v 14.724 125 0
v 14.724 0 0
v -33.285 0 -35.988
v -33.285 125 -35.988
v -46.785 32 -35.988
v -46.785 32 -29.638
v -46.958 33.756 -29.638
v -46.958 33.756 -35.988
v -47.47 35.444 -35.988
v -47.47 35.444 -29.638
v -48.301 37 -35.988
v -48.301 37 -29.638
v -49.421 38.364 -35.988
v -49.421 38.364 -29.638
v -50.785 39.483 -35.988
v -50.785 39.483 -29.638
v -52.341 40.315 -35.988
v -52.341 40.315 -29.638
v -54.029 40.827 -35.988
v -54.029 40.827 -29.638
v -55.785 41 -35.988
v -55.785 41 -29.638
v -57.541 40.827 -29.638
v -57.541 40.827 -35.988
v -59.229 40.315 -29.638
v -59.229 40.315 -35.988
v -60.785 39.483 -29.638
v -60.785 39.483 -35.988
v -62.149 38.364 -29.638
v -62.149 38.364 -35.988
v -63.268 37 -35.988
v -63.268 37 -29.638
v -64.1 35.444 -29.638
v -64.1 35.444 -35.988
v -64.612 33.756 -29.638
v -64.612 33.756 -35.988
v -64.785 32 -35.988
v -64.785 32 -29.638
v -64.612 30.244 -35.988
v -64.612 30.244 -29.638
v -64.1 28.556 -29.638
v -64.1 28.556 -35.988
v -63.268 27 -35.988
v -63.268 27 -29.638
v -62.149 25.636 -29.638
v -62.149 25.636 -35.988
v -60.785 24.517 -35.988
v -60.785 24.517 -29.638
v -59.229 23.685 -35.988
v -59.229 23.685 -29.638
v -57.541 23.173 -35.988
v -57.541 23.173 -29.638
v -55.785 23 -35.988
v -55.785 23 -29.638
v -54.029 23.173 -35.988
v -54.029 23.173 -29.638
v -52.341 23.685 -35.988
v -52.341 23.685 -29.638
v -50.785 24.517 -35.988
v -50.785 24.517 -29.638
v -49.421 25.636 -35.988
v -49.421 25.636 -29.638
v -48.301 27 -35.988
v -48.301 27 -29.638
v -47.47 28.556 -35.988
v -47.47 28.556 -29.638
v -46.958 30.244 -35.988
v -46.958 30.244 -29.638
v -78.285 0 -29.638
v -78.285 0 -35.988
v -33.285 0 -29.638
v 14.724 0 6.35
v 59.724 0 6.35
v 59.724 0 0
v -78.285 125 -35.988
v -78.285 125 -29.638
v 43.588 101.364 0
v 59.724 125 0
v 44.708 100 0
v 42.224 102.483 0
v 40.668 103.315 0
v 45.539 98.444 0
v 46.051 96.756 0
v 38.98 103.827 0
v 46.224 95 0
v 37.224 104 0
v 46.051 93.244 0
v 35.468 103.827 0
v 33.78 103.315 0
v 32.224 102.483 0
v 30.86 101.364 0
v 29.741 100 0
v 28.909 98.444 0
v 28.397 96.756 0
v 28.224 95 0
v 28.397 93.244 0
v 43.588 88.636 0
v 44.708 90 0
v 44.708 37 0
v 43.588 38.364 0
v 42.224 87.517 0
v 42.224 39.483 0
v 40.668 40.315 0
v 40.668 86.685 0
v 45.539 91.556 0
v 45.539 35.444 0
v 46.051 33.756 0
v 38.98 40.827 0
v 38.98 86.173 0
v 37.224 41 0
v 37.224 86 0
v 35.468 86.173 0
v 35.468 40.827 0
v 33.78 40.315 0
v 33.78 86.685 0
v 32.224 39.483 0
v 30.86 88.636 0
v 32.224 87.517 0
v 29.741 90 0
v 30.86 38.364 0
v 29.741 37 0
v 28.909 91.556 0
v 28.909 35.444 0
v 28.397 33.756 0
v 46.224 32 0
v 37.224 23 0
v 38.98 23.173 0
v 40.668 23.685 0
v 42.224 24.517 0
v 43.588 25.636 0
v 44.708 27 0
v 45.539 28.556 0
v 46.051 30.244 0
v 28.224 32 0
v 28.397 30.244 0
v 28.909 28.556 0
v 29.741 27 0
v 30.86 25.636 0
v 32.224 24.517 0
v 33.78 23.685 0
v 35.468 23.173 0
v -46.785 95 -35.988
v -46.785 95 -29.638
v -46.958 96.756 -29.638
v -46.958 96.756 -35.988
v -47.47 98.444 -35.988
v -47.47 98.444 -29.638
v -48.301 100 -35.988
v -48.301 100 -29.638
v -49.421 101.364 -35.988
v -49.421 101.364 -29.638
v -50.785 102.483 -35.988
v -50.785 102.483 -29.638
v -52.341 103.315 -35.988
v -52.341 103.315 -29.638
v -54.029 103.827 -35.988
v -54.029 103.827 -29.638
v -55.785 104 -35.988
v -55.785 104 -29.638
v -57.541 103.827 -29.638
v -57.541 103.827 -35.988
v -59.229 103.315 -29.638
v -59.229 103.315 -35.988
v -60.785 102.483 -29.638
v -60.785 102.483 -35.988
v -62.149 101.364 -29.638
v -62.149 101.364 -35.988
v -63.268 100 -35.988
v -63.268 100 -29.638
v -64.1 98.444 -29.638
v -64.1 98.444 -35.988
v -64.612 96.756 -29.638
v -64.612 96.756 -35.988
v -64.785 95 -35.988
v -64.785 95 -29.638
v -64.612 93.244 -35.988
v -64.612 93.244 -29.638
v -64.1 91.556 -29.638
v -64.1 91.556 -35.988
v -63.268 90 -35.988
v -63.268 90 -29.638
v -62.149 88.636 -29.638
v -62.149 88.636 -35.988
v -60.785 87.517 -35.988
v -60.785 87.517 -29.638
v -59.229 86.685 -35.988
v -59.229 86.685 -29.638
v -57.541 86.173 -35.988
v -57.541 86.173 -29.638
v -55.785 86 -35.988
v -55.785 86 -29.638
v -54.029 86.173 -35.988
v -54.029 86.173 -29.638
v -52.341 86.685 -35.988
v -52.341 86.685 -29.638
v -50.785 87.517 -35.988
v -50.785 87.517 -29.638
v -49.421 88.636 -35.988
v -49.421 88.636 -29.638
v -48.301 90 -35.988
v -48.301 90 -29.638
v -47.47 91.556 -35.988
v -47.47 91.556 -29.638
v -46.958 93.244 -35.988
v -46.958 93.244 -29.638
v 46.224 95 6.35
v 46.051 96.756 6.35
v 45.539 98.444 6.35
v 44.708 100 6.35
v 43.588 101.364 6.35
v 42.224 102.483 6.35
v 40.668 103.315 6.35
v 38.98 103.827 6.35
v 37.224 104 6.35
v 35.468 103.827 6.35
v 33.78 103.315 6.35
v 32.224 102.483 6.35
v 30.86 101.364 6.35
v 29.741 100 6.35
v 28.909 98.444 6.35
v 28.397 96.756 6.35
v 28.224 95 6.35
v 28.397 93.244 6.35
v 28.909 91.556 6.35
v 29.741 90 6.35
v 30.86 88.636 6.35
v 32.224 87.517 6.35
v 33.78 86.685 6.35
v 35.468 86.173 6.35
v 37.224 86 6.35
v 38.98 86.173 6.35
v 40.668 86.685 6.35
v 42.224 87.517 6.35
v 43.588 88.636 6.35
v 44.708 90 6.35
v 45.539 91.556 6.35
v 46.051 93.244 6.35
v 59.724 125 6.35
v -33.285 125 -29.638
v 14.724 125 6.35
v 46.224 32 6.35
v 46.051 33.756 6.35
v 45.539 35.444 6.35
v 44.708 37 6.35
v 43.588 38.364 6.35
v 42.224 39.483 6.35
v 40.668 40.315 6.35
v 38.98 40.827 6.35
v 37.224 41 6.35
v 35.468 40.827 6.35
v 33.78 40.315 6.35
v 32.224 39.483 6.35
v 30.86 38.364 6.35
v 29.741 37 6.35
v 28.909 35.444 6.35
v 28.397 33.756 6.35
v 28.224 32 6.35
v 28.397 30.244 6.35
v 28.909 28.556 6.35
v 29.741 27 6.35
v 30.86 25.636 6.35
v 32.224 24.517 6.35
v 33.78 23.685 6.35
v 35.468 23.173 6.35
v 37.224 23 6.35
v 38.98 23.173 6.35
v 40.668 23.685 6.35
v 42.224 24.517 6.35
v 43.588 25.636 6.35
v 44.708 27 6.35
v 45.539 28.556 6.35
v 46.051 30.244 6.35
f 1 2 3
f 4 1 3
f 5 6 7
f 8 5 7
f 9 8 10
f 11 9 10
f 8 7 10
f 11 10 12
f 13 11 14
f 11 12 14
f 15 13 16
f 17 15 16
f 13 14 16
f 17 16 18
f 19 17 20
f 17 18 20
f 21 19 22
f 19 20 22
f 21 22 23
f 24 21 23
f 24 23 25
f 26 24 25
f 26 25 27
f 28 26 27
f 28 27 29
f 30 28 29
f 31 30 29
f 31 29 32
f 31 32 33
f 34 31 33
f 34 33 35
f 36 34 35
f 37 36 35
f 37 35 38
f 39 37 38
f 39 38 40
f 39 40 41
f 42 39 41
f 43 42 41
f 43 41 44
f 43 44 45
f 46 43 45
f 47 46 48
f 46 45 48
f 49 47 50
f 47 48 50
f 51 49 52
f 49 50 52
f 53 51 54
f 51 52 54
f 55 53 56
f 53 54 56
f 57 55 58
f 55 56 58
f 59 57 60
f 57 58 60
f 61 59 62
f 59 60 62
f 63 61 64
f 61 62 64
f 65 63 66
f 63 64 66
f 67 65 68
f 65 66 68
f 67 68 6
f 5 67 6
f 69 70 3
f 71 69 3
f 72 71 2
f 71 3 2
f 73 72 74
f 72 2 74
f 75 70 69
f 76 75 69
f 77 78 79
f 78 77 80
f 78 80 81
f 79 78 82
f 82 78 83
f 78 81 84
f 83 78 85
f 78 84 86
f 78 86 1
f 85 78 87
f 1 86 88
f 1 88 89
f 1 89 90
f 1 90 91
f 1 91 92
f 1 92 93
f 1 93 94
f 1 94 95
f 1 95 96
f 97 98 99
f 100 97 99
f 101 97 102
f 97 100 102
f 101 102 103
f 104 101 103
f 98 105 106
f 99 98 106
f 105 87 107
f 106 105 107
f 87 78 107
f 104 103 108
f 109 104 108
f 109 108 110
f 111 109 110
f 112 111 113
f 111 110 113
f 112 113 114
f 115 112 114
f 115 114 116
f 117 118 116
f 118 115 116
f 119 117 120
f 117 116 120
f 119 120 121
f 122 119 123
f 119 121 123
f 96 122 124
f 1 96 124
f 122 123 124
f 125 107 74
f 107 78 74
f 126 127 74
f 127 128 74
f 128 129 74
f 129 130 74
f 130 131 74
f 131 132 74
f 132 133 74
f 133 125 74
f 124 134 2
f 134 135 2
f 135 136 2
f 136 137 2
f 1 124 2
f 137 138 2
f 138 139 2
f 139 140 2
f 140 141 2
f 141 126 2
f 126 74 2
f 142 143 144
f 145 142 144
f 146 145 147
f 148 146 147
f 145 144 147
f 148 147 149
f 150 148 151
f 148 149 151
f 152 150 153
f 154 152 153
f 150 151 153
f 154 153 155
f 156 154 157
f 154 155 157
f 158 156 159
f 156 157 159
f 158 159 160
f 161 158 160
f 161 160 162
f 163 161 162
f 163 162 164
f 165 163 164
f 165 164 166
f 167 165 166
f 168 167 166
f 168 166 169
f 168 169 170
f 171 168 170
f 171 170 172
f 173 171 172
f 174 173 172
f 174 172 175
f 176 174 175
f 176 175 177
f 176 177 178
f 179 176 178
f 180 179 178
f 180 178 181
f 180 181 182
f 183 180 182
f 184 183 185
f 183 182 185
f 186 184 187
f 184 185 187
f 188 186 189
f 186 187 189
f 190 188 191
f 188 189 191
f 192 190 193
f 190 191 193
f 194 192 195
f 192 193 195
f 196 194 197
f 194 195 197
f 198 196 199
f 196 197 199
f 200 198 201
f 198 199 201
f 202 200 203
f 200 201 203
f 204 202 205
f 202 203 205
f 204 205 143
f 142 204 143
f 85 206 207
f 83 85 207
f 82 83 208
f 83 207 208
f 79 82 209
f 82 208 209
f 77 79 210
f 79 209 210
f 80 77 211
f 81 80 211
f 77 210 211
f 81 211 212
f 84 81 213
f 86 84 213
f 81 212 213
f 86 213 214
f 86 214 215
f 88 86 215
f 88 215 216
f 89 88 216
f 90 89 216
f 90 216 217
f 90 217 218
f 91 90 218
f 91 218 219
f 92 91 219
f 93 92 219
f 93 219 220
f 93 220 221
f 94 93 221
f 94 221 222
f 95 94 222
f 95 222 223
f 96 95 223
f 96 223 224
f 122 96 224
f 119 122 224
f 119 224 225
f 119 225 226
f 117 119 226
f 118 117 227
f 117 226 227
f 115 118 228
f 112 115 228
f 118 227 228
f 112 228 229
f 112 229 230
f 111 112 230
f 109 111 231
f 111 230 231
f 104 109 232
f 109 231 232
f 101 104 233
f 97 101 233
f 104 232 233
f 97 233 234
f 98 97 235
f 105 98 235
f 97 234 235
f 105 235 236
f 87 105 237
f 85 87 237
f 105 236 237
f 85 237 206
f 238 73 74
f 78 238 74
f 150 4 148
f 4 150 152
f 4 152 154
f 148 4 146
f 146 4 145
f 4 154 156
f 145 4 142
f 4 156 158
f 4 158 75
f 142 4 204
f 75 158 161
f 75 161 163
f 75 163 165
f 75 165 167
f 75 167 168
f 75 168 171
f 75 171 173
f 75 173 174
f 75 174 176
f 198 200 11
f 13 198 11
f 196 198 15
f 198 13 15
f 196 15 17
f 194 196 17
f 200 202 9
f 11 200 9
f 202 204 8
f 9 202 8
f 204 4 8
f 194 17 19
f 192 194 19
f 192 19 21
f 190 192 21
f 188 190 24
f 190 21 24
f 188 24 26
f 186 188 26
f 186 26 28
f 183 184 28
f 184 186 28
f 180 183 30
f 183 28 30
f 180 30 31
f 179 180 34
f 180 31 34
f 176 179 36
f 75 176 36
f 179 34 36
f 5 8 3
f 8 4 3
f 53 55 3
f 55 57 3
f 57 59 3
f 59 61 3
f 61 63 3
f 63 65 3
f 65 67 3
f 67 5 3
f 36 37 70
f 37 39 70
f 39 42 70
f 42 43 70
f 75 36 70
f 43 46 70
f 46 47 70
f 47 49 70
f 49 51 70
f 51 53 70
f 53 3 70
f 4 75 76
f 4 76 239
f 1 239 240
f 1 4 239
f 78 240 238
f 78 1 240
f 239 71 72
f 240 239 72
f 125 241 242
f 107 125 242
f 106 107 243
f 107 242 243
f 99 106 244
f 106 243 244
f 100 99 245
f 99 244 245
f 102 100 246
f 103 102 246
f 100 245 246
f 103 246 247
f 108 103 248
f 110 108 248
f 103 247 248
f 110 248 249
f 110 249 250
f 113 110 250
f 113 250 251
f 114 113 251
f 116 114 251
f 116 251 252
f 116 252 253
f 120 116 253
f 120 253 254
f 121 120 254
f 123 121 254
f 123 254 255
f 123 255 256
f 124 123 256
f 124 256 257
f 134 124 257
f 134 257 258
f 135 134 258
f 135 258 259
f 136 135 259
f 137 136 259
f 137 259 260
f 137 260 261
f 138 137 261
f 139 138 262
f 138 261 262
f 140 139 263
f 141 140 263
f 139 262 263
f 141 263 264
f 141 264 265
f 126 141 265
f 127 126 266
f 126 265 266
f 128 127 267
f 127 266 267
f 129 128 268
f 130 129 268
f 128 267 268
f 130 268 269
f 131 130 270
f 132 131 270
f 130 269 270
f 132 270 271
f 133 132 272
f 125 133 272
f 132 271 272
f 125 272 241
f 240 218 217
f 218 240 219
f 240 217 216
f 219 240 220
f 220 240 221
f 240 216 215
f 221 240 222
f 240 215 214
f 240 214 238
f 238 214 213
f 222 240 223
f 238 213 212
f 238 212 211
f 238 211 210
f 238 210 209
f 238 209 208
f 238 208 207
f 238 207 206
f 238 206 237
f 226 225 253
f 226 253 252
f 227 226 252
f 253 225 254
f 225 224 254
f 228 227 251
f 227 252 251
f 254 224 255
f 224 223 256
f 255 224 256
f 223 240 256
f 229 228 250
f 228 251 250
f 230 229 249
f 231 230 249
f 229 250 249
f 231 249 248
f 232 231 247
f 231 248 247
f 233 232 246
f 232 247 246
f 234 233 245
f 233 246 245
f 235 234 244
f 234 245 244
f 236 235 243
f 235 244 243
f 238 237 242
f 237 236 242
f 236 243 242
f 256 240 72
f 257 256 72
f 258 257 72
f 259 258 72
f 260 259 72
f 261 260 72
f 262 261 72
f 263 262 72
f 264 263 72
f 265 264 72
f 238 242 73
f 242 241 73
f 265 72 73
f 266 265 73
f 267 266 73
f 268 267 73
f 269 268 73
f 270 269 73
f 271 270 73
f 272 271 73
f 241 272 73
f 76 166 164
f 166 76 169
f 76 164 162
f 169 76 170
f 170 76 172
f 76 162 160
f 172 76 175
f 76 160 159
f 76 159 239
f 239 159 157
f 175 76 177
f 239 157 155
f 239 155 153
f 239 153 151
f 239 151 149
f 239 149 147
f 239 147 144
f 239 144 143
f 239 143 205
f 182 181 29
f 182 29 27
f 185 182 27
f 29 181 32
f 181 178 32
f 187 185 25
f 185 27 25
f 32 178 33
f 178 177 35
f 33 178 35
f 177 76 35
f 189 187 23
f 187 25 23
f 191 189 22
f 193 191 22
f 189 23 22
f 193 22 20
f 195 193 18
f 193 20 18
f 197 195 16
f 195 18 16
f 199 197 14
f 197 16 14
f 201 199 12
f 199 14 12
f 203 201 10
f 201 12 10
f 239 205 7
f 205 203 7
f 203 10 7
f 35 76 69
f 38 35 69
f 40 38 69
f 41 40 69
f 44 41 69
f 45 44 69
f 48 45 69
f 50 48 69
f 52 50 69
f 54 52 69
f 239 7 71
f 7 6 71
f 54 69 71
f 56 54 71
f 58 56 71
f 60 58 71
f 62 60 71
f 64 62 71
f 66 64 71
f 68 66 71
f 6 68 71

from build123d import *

# Parameters (mm, degrees)
BOSS_EXTRUDE1_DEPTH = 125
SKETCH4_R           = 9
CUT_EXTRUDE1_DEPTH  = 152.817765536
SKETCH5_R           = 9
CUT_EXTRUDE2_DEPTH  = 154.447072098


with BuildPart() as part:
    # Sketch1 → Boss-Extrude1 (new body)
    with BuildSketch(Plane(origin=(0, 0, 0), x_dir=(1, 0, 0), z_dir=(0, 1, 0))):
        Polygon((-78.284726088, 35.987992356), (-78.284726088, 29.637992356), (-33.284726088, 29.637992356), (14.724277299, -6.35), (59.724277299, -6.35), (59.724277299, 0), (14.724277299, 0), (-33.284726088, 35.987992356), align=None)
    extrude(amount=BOSS_EXTRUDE1_DEPTH)

    # Sketch4 → Cut-Extrude1 (cut, through all)
    with BuildSketch(Plane.XY.offset(-29.637992356)):
        with Locations((-55.784726088, 95)):
            Circle(SKETCH4_R)
        with Locations((-55.784726088, 32)):
            Circle(SKETCH4_R)
    extrude(amount=-CUT_EXTRUDE1_DEPTH, mode=Mode.SUBTRACT)

    # Sketch5 → Cut-Extrude2 (cut, through all)
    with BuildSketch(Plane.XY.offset(6.35)):
        with Locations((37.224277299, 95)):
            Circle(SKETCH5_R)
        with Locations((37.224277299, 32)):
            Circle(SKETCH5_R)
    extrude(amount=-CUT_EXTRUDE2_DEPTH, mode=Mode.SUBTRACT)


solid = part.part
